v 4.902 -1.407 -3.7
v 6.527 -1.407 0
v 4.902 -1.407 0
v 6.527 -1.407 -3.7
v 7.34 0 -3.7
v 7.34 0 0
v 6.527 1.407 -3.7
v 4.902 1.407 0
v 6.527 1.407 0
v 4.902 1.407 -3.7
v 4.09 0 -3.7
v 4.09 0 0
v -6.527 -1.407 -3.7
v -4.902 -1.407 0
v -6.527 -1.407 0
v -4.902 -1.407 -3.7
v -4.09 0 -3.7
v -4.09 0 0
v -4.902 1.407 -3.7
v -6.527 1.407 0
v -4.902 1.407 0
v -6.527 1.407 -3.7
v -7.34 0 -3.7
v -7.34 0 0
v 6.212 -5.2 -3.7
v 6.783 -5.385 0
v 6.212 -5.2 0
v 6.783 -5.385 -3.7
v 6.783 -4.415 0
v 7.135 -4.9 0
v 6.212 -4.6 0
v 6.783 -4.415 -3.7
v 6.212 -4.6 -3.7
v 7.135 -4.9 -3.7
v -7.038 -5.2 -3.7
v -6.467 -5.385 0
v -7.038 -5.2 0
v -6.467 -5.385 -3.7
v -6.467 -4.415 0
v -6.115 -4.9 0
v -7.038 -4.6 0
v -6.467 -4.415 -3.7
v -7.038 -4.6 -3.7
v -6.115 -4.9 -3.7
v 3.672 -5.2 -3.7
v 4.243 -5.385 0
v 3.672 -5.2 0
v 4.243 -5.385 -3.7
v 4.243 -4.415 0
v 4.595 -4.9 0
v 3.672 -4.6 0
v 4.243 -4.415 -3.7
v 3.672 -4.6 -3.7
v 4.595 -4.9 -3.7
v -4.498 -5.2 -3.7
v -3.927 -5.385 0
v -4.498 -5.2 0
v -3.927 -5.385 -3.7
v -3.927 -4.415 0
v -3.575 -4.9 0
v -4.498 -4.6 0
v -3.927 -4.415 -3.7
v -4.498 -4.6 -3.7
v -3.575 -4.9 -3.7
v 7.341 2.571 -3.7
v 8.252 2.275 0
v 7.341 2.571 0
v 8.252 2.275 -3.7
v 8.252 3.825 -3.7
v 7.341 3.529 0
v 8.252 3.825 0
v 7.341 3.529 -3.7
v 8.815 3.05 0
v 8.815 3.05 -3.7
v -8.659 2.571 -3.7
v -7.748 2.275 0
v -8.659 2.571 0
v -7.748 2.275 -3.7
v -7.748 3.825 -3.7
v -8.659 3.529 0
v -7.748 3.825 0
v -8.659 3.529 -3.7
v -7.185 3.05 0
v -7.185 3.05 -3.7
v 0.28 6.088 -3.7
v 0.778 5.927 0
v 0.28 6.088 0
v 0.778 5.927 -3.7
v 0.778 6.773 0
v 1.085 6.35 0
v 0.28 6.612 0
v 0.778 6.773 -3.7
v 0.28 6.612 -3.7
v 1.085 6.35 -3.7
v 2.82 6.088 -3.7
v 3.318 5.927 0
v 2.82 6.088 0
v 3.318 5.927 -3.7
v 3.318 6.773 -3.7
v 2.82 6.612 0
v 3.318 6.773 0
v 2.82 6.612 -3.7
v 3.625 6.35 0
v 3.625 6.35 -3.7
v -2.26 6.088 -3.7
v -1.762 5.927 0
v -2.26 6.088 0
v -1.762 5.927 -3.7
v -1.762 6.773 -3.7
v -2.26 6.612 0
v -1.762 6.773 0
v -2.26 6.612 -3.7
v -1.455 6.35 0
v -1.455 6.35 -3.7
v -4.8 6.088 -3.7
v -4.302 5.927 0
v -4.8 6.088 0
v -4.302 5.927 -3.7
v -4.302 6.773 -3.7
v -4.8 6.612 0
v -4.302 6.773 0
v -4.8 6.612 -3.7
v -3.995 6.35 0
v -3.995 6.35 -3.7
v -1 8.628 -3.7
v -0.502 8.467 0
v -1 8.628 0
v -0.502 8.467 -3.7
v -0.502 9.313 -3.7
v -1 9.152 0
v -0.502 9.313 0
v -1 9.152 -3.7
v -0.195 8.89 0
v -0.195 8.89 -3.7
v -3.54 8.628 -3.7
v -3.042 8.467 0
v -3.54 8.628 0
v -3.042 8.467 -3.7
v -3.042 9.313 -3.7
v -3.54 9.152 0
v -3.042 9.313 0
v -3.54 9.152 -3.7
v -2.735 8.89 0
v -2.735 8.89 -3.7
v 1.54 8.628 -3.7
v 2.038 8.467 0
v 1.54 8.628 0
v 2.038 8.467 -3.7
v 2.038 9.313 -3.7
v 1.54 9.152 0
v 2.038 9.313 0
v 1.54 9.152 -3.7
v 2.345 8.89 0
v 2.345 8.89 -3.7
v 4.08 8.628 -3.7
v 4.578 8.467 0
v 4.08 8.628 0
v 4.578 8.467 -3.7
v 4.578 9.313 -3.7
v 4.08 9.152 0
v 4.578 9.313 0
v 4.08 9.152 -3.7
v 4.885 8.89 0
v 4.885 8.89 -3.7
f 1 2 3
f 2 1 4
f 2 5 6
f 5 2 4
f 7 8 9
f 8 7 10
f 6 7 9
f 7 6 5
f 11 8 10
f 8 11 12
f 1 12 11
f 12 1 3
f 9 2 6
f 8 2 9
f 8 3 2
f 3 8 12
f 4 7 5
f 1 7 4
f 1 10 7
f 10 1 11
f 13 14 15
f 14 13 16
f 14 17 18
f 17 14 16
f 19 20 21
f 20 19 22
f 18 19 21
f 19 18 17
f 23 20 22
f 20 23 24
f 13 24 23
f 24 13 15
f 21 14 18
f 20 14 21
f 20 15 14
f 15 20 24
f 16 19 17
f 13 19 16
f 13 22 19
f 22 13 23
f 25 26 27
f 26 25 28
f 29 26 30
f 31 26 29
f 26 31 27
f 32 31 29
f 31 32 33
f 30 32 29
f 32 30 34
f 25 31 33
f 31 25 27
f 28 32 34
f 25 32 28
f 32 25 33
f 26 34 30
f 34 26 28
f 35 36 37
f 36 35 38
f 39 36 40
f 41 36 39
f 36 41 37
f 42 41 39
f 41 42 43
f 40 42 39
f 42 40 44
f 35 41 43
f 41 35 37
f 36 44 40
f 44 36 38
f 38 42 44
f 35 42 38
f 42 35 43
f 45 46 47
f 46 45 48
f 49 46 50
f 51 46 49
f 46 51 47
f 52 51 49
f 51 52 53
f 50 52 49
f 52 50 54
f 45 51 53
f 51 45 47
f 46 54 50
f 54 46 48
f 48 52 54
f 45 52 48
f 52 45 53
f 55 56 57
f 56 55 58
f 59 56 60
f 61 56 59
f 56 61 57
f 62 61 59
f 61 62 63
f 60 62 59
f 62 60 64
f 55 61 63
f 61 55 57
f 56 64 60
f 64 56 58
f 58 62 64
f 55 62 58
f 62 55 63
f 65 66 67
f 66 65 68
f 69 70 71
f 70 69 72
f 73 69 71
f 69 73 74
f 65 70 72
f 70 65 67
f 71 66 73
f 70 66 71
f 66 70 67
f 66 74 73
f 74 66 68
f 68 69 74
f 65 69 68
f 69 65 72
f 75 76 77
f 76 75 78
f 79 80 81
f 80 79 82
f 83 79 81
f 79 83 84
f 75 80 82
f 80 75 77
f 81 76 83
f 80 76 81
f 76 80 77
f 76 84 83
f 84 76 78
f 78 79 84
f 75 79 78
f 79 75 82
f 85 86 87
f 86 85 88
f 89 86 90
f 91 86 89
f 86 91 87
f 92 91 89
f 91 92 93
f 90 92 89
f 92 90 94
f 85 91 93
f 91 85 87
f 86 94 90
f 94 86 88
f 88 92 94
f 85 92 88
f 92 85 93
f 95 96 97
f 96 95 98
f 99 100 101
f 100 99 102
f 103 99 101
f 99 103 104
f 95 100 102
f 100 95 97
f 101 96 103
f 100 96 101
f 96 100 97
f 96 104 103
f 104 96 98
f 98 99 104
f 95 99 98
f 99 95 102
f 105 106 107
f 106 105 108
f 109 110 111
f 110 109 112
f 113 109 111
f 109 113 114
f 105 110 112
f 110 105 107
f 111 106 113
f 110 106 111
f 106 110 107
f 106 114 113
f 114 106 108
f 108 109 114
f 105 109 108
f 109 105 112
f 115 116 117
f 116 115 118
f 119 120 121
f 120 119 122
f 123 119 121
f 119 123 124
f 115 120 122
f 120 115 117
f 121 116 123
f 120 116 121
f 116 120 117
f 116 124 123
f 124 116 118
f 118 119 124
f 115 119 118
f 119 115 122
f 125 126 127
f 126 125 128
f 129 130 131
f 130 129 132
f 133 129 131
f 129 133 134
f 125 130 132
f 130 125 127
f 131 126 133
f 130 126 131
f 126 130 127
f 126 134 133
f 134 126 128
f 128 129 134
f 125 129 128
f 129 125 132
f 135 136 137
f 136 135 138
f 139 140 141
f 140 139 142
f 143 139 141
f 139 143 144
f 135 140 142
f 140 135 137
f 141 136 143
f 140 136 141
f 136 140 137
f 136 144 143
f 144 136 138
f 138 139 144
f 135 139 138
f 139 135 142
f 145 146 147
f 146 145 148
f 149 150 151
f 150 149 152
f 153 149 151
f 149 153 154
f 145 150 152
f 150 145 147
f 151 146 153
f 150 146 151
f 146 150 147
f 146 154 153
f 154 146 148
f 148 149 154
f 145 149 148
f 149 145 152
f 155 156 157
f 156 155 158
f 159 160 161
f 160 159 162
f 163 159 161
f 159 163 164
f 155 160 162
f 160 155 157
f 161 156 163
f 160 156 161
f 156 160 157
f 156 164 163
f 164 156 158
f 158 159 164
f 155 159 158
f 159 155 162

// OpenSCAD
translate([11.43/2, 0, -3.7])
    cylinder(3.7,3.25/2,3.25/2);
translate([-11.43/2, 0, -3.7])
    cylinder(3.7,3.25/2,3.25/2);

translate([ 13.25/2, -4.9, -3.7])
    cylinder(3.7,1.02/2,1.02/2);
translate([ -13.25/2, -4.9, -3.7])
    cylinder(3.7,1.02/2,1.02/2);

translate([ 13.25/2-2.54, -4.9, -3.7])
    cylinder(3.7,1.02/2,1.02/2);
translate([ -13.25/2+2.54, -4.9, -3.7])
    cylinder(3.7,1.02/2,1.02/2);

translate([16/2,3.05,-3.7])
    cylinder(3.7,1.63/2,1.63/2);
translate([-16/2,3.05,-3.7])
    cylinder(3.7,1.63/2,1.63/2);

// pin 5
#translate([ 0.64, 8.89-2.54, -3.7])    
    cylinder(3.7,0.89/2,0.89/2);
// pin 7
translate([ 0.64+2.54, 8.89-2.54, -3.7])    
    cylinder(3.7,0.89/2,0.89/2);
// pin 3
translate([ 0.64-2.54, 8.89-2.54, -3.7])    
    cylinder(3.7,0.89/2,0.89/2);
// pin 1
translate([ 0.64-2.54*2, 8.89-2.54, -3.7])    
    cylinder(3.7,0.89/2,0.89/2);


// pin 4 
translate([ -0.64, 8.89, -3.7])    
    cylinder(3.7,0.89/2,0.89/2);
// pin 2
translate([ -0.64-2.54, 8.89, -3.7])    
    cylinder(3.7,0.89/2,0.89/2);
// pin 6
translate([ -0.64+2.54, 8.89, -3.7])    
    cylinder(3.7,0.89/2,0.89/2);
// pin 8
translate([ -0.64+2.54*2, 8.89, -3.7])    
    cylinder(3.7,0.89/2,0.89/2);
